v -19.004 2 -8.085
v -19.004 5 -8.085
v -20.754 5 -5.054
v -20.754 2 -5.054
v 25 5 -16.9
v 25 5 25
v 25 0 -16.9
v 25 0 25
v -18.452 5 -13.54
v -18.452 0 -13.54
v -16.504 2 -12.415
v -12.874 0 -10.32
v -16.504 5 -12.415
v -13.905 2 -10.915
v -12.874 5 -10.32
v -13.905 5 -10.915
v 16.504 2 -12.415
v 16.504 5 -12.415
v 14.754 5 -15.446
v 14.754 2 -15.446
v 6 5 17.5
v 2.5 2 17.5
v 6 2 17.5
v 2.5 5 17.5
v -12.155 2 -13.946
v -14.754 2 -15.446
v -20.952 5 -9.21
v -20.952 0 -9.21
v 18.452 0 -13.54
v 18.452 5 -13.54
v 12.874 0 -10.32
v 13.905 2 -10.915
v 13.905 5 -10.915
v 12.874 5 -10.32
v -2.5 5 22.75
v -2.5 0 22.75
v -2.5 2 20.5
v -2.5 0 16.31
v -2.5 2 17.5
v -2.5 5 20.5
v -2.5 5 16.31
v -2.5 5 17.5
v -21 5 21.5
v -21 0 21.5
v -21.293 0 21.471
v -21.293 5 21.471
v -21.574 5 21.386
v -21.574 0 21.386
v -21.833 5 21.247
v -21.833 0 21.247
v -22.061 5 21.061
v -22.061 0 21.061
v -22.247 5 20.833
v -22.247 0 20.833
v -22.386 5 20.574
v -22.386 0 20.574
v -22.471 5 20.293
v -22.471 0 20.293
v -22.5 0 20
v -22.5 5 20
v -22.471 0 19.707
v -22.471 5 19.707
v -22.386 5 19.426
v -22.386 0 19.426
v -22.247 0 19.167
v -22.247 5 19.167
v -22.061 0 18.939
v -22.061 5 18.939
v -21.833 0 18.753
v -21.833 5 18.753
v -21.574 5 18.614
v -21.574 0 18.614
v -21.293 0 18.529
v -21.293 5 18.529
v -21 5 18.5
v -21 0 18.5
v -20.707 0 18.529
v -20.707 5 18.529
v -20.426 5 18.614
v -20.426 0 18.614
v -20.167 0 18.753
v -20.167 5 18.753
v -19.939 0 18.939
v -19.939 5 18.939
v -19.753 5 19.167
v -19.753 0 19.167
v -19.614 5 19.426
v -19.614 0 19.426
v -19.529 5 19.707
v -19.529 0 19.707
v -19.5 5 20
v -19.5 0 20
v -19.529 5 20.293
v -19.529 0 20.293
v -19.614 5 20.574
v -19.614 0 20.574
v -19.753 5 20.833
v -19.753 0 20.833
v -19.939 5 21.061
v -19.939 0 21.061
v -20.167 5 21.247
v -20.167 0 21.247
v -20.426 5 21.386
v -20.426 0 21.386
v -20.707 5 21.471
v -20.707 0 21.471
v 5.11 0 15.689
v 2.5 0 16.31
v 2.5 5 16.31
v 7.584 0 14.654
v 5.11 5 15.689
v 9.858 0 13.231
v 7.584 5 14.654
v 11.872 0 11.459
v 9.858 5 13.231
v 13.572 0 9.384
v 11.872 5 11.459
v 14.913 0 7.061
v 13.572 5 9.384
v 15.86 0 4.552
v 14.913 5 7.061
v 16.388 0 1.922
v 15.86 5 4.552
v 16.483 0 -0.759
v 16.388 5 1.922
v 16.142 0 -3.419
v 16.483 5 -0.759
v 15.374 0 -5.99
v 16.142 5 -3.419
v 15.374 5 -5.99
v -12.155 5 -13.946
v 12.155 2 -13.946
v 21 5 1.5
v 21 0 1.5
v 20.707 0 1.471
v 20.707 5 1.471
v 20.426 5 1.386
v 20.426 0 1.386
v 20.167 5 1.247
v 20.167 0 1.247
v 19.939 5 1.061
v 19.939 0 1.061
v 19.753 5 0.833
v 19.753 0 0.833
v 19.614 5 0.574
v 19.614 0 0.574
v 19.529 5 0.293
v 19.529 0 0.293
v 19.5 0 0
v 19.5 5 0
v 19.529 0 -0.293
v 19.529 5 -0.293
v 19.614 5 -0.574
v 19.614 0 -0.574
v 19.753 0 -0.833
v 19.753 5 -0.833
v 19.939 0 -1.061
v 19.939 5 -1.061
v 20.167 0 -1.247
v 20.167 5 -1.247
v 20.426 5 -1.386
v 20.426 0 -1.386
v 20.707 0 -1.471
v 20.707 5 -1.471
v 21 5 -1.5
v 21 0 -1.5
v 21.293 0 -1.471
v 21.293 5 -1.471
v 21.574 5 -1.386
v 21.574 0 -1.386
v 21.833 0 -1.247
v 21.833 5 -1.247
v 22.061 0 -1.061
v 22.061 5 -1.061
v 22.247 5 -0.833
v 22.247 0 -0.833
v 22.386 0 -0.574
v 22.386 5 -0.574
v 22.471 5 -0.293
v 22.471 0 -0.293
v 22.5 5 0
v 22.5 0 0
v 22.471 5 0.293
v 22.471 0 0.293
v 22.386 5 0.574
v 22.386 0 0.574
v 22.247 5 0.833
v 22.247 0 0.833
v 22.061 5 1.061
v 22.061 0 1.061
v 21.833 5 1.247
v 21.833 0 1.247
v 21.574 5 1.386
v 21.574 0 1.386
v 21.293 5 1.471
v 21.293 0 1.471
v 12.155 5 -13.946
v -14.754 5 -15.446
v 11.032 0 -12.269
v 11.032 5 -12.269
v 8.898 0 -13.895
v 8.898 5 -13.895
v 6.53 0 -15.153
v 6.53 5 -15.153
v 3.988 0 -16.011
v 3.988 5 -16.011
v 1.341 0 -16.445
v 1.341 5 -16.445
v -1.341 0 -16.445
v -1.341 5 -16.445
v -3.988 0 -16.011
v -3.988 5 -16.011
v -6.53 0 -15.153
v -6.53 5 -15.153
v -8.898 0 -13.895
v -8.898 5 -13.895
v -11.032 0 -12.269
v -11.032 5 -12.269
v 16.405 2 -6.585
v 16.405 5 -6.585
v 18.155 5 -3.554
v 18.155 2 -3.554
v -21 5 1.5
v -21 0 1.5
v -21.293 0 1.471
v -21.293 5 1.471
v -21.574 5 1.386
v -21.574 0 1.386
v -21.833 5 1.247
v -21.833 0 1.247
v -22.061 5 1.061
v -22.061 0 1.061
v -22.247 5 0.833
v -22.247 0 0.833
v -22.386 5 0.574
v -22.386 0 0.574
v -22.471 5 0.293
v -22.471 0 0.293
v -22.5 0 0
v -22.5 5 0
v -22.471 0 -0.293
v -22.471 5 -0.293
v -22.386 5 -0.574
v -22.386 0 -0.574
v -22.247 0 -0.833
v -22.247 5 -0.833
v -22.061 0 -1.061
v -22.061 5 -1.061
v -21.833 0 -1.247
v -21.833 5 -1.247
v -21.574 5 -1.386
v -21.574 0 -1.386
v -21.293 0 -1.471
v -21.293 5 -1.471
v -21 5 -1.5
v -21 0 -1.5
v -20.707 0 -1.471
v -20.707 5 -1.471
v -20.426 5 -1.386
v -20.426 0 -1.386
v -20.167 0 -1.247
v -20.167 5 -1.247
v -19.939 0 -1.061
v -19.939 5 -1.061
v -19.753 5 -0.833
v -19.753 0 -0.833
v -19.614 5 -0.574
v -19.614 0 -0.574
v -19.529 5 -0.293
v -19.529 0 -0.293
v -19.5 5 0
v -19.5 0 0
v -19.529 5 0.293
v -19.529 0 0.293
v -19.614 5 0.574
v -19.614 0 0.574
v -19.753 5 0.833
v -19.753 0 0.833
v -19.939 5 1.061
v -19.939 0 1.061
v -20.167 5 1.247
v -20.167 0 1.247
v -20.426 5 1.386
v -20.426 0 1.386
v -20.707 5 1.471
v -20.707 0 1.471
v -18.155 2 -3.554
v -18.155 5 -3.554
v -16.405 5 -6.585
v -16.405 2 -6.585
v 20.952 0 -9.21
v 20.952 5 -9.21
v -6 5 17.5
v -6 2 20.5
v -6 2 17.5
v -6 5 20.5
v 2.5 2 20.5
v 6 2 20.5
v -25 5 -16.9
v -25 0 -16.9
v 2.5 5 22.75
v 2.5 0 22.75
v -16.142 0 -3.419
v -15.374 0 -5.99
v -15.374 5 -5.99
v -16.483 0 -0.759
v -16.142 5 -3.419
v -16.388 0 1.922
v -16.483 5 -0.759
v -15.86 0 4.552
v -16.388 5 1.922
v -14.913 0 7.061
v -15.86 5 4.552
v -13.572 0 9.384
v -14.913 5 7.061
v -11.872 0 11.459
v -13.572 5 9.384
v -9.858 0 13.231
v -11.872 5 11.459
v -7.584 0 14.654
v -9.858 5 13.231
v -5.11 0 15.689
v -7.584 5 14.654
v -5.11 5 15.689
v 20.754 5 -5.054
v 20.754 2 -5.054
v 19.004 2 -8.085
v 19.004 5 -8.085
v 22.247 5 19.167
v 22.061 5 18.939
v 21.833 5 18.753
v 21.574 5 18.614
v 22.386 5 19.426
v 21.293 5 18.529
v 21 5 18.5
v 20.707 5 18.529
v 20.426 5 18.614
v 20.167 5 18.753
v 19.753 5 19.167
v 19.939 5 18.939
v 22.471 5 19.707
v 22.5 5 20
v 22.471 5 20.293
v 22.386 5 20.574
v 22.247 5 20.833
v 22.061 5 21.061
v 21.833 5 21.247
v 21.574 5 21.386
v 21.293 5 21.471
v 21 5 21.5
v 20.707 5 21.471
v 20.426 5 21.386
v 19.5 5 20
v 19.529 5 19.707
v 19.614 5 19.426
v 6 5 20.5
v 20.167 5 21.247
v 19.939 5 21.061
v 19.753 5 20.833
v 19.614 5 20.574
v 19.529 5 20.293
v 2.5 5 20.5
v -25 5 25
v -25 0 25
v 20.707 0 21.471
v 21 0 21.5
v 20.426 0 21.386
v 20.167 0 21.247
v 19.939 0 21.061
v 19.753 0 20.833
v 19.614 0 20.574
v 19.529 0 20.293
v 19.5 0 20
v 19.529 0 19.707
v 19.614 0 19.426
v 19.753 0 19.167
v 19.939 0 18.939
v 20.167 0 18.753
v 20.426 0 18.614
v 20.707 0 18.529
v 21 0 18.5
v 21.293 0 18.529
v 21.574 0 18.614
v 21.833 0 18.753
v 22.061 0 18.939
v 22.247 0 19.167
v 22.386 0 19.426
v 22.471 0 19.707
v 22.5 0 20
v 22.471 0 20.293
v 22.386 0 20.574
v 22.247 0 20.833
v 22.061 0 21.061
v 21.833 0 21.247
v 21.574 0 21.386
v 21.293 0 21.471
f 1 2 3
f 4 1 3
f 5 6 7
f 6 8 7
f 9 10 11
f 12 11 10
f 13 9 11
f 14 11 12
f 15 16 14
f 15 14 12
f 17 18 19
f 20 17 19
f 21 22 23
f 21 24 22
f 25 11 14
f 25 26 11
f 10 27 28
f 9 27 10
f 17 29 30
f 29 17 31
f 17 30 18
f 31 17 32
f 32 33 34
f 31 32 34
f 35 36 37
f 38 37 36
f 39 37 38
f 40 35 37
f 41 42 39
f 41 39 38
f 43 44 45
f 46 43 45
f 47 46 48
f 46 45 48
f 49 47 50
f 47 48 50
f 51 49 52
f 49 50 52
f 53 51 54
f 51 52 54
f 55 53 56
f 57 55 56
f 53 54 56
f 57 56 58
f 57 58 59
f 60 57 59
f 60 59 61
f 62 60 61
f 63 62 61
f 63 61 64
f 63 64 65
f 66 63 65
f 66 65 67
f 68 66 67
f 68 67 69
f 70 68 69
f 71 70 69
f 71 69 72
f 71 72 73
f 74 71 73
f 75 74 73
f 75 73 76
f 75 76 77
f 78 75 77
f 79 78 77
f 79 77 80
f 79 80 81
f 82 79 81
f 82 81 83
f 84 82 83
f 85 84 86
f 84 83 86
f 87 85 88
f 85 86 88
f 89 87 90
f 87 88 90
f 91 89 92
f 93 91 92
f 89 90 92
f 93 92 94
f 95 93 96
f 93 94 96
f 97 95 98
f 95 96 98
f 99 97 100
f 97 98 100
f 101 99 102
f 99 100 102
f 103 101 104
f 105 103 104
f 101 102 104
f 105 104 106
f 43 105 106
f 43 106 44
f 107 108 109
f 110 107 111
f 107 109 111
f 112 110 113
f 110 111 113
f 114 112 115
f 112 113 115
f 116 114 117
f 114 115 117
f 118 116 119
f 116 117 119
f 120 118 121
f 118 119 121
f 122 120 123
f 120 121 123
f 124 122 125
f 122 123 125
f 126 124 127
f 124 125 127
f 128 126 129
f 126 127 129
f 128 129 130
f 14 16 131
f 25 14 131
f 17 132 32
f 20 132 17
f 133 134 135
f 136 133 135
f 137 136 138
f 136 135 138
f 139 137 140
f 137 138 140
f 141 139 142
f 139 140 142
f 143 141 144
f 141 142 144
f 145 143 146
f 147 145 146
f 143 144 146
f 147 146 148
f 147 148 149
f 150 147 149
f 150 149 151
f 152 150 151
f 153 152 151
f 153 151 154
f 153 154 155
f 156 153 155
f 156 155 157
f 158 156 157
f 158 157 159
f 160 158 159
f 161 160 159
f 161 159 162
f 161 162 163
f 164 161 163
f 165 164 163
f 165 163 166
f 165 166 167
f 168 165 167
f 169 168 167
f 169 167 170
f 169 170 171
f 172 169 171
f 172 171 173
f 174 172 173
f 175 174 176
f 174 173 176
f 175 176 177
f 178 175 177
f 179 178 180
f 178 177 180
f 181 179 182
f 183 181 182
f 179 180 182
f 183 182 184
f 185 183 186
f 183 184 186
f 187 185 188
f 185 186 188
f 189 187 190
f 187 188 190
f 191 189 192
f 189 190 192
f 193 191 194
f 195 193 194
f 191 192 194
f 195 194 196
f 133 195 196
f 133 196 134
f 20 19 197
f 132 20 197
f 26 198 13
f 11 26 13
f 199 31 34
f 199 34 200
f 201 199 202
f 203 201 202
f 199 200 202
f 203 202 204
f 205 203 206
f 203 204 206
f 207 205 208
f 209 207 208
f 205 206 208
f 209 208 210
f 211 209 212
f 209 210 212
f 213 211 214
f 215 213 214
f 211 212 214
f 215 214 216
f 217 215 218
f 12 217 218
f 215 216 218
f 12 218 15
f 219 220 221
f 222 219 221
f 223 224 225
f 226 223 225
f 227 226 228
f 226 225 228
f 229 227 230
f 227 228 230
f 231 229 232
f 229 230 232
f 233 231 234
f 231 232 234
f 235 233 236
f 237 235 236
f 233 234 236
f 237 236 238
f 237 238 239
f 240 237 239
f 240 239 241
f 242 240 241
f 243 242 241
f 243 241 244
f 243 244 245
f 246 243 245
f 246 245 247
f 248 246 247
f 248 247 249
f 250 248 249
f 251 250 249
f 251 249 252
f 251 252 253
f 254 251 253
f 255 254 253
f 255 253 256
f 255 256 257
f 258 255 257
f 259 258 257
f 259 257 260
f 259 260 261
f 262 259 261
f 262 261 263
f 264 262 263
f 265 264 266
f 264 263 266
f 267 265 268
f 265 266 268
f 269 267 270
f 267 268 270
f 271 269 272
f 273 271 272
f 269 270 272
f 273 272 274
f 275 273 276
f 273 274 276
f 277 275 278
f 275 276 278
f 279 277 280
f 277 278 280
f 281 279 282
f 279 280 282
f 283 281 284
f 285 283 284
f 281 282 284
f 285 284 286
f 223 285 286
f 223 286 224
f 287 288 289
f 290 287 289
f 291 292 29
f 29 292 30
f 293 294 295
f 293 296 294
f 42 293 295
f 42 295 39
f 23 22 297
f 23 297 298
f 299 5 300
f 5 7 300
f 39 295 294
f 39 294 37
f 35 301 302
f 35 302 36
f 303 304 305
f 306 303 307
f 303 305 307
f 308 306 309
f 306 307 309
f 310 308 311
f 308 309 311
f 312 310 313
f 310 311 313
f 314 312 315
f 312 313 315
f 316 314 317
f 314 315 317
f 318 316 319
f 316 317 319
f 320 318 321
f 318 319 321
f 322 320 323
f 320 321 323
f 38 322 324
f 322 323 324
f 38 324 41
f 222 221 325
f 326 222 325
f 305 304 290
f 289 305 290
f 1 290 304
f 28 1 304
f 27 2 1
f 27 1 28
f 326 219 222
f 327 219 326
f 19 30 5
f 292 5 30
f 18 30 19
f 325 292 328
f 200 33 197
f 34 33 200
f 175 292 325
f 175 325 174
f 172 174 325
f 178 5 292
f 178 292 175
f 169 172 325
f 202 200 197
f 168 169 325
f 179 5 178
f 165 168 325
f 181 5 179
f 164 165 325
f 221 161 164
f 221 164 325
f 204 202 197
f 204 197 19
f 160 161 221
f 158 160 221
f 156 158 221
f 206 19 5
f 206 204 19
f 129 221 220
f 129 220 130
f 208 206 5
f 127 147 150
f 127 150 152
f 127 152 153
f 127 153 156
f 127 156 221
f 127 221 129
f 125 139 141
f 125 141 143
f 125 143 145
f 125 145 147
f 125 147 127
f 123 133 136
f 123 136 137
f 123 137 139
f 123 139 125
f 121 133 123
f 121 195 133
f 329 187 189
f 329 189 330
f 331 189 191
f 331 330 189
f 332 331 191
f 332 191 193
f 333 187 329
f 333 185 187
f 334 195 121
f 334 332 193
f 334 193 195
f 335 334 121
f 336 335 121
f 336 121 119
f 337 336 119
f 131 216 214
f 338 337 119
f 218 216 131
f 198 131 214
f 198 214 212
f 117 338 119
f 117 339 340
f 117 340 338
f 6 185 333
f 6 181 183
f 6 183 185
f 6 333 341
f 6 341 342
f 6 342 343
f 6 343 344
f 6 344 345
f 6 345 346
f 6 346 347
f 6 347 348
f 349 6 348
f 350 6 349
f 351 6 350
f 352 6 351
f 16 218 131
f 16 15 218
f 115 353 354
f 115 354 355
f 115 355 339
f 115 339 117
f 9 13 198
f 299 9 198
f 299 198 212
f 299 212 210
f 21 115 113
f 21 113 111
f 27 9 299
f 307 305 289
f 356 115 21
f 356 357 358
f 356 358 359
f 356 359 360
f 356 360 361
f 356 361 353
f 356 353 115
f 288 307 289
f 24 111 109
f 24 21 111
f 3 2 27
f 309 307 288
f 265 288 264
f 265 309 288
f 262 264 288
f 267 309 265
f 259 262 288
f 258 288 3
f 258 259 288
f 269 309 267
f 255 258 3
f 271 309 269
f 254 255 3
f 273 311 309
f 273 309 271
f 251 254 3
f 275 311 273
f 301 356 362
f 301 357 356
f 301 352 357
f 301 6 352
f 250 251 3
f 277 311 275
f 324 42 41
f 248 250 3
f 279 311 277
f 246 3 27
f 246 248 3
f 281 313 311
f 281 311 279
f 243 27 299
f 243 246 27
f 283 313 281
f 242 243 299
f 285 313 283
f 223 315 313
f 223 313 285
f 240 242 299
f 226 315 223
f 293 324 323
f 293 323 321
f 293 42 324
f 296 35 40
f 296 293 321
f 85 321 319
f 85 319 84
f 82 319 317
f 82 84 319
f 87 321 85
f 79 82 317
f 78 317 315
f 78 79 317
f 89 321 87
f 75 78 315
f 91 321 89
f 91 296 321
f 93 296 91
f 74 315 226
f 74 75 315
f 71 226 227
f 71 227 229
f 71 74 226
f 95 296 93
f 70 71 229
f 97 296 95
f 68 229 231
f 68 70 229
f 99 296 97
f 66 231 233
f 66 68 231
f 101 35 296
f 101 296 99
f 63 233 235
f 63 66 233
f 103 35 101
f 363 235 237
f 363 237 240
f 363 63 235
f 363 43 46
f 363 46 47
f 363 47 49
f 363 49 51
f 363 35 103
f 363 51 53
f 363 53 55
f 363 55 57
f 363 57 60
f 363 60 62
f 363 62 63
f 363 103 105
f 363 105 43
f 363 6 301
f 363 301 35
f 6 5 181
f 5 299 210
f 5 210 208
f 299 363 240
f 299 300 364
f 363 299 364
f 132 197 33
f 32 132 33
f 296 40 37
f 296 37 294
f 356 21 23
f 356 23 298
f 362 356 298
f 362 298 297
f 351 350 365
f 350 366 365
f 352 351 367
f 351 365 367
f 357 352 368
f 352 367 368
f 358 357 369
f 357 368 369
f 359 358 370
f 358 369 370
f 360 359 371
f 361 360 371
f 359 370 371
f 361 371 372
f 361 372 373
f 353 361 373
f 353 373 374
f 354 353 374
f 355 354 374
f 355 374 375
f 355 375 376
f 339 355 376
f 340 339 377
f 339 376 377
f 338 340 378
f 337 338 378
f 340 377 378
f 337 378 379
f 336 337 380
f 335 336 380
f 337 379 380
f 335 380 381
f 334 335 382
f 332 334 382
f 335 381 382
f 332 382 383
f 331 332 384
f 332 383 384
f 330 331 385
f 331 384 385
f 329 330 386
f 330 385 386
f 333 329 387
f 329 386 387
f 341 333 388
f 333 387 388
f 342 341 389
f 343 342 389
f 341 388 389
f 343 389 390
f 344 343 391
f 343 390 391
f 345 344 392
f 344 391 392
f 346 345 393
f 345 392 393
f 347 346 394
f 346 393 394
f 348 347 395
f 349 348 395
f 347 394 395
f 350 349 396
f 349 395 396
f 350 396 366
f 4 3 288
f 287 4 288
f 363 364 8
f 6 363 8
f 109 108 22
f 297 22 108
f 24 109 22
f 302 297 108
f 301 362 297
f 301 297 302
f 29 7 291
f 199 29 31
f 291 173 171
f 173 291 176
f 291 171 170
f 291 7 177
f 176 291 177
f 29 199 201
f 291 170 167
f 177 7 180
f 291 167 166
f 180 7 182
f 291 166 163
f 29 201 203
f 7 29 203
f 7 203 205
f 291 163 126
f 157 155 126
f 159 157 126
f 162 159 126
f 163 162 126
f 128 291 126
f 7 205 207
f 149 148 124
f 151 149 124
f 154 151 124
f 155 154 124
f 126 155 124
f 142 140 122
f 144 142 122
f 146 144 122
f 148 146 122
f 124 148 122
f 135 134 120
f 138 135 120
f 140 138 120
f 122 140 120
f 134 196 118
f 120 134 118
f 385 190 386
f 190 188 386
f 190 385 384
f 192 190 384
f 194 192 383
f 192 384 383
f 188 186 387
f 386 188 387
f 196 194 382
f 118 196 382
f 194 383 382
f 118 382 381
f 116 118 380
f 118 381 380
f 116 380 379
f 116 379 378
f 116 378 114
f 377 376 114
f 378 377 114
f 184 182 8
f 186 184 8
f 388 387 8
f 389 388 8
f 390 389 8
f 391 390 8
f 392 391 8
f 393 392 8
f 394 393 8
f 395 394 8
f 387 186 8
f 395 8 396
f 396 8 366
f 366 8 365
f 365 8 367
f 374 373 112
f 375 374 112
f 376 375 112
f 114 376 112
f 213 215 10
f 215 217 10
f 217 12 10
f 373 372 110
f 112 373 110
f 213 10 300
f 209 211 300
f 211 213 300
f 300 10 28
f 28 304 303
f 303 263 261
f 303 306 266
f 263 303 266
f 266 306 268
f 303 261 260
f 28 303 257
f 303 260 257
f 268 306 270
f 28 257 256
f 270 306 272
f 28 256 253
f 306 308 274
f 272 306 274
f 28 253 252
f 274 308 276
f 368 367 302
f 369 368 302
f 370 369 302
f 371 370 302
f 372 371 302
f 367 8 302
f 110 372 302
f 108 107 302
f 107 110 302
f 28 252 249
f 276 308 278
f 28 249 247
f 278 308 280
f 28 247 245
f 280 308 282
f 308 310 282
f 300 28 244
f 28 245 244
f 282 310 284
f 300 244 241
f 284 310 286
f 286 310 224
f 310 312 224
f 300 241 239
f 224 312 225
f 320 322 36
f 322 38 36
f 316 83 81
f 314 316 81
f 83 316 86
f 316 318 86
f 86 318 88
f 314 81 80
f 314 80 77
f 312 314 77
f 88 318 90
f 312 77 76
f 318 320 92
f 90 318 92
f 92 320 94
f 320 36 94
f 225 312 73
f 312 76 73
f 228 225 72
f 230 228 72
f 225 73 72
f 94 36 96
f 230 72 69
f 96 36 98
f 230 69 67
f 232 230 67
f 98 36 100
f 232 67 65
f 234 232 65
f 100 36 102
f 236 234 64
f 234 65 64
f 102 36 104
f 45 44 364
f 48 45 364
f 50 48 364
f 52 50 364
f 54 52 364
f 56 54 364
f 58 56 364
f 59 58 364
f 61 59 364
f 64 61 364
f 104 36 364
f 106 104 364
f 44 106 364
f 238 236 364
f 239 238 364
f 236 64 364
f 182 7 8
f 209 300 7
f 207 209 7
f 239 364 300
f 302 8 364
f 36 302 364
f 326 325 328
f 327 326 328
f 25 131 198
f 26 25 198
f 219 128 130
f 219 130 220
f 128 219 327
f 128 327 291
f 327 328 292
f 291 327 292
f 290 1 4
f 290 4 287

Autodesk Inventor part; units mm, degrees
ref_plane "YZ Plane" through (0, 0, 0) normal (1, 0, 0) x (0, 1, 0)
ref_plane "XZ Plane" through (0, 0, 0) normal (0, 1, 0) x (-1, 0, 0)
ref_plane "XY Plane" through (0, 0, 0) normal (0, 0, 1) x (1, 0, 0)
sketch "スケッチ1" plane through (0, 0, 0) normal (0, 1, 0) x (-1, 0, 0)
  line L0 (-25, -16.9) -> (25, -16.9)
  line L1 (25, -16.9) -> (25, 25)
  line L2 (25, 25) -> (-25, 25)
  line L3 (-25, 25) -> (-25, -16.9)
  point P0 (0, 0)
  point P1 (0, 25)
  dimension "d0" = 50
  dimension "d62" = 25
  dimension "d63" = 16.9
extrude "押し出し1" add sketch "スケッチ1" along normal blind 5
sketch "スケッチ2" plane through (0, 5, 0) normal (0, 1, 0) x (1, 0, 0)
  circle A0 centre (0, 0) radius 16.5
  dimension "d4" = 33
extrude "押し出し2" cut sketch "スケッチ2" against normal blind 5
sketch "スケッチ3" plane through (0, 5, 0) normal (0, 1, 0) x (1, 0, 0)
  line L0 (-6, -17.5) -> (6, -17.5)
  line L1 (6, -17.5) -> (6, -20.5)
  line L2 (6, -20.5) -> (-6, -20.5)
  line L3 (-6, -20.5) -> (-6, -17.5)
  line L4 (-6, -17.5) -> (6, -20.5) construction
  line L5 (6, -17.5) -> (-6, -20.5) construction
  line L6 (-14.7535, 15.4462) -> (-20.7535, 5.0538)
  line L7 (-20.7535, 5.0538) -> (-18.1554, 3.5538)
  line L8 (-18.1554, 3.5538) -> (-12.1554, 13.9462)
  line L9 (-12.1554, 13.9462) -> (-14.7535, 15.4462)
  line L10 (-14.7535, 15.4462) -> (-18.1554, 3.5538) construction
  line L11 (-20.7535, 5.0538) -> (-12.1554, 13.9462) construction
  line L12 (-25, 16.9) -> (-25, -25) projected
  line L13 (12.1554, 13.9462) -> (18.1554, 3.5538)
  line L14 (18.1554, 3.5538) -> (20.7535, 5.0538)
  line L15 (20.7535, 5.0538) -> (14.7535, 15.4462)
  line L16 (14.7535, 15.4462) -> (12.1554, 13.9462)
  line L17 (12.1554, 13.9462) -> (20.7535, 5.0538) construction
  line L18 (18.1554, 3.5538) -> (14.7535, 15.4462) construction
  line L19 (25, -25) -> (25, 16.9) projected
  point P0 (0, 0)
  point P1 (0, -19)
  point P2 (-16.4545, 9.5)
  point P3 (16.4545, 9.5)
  point P4 (16.4545, 9.5)
  point P5 (16.4545, 9.5)
  dimension "d7" = 120
  dimension "d8" = 120
  dimension "d9" = 19
  dimension "d10" = 19
  dimension "d11" = 19
  dimension "d12" = 3
  dimension "d13" = 12
  dimension "d14" = 30
  dimension "d15" = 12
  dimension "d16" = 3
  dimension "d17" = 30
  dimension "d18" = 3
  dimension "d19" = 12
extrude "押し出し3" cut sketch "スケッチ3" against normal blind 3
sketch "スケッチ4" plane through (0, 5, 0) normal (0, 1, 0) x (1, 0, 0)
  line L0 (2.5, -15.25) -> (2.5, -22.75)
  line L1 (2.5, -22.75) -> (-2.5, -22.75)
  line L2 (-2.5, -22.75) -> (-2.5, -15.25)
  line L3 (-2.5, -15.25) -> (2.5, -15.25)
  line L4 (2.5, -15.25) -> (-2.5, -22.75) construction
  line L5 (2.5, -22.75) -> (-2.5, -15.25) construction
  line L6 (18.4521, 13.5401) -> (11.9569, 9.7901)
  line L7 (11.9569, 9.7901) -> (14.4569, 5.4599)
  line L8 (14.4569, 5.4599) -> (20.9521, 9.2099)
  line L9 (20.9521, 9.2099) -> (18.4521, 13.5401)
  line L10 (18.4521, 13.5401) -> (14.4569, 5.4599) construction
  line L11 (11.9569, 9.7901) -> (20.9521, 9.2099) construction
  line L12 (25, -25) -> (25, 16.9) projected
  line L13 (-18.4521, 13.5401) -> (-11.9569, 9.7901)
  line L14 (-11.9569, 9.7901) -> (-14.4569, 5.4599)
  line L15 (-14.4569, 5.4599) -> (-20.9521, 9.2099)
  line L16 (-20.9521, 9.2099) -> (-18.4521, 13.5401)
  line L17 (-18.4521, 13.5401) -> (-14.4569, 5.4599) construction
  line L18 (-11.9569, 9.7901) -> (-20.9521, 9.2099) construction
  line L19 (-25, 16.9) -> (-25, -25) projected
  point P0 (0, 0)
  point P1 (16.4545, 9.5)
  point P2 (0, -19)
  point P3 (-16.4545, 9.5)
  dimension "d28" = 120
  dimension "d29" = 120
  dimension "d30" = 19
  dimension "d31" = 19
  dimension "d32" = 19
  dimension "d33" = 30
  dimension "d34" = 7.5
  dimension "d35" = 5
  dimension "d38" = 7.5
  dimension "d39" = 5
  dimension "d40" = 5
  dimension "d41" = 7.5
  dimension "d42" = 30
extrude "押し出し4" cut sketch "スケッチ4" against normal blind 5
sketch "スケッチ5" plane through (0, 5, 0) normal (0, 1, 0) x (1, 0, 0)
  line L0 (-25, -25) -> (25, -25) projected
  line L1 (25, 16.9) -> (-25, 16.9) projected
  line L2 (-25, 16.9) -> (-25, -25) projected
  line L3 (25, -25) -> (25, 16.9) projected
  point P0 (0, 0)
  point P1 (21, -20)
  point P2 (-21, -20)
  point P3 (-21, 0)
  point P4 (21, 0)
  point P5 (15, 0)
  point P6 (-15, 0)
  dimension "d45" = 5
  dimension "d48" = 5
  dimension "d49" = 4
  dimension "d50" = 4
  dimension "d51" = 4
  dimension "d52" = 4
  dimension "d60" = 6
  dimension "d61" = 6
  dimension "d64" = 20
hole "穴1" at (21, 5, 20) at (-21, 5, 20) at (-21, 5, 0) at (21, 5, 0) at (15, 5, 0) at (-15, 5, 0) direction (0, -1, 0) diameter 3 end through all
properties part number "trackball_base" material "アルミニウム 6061"
